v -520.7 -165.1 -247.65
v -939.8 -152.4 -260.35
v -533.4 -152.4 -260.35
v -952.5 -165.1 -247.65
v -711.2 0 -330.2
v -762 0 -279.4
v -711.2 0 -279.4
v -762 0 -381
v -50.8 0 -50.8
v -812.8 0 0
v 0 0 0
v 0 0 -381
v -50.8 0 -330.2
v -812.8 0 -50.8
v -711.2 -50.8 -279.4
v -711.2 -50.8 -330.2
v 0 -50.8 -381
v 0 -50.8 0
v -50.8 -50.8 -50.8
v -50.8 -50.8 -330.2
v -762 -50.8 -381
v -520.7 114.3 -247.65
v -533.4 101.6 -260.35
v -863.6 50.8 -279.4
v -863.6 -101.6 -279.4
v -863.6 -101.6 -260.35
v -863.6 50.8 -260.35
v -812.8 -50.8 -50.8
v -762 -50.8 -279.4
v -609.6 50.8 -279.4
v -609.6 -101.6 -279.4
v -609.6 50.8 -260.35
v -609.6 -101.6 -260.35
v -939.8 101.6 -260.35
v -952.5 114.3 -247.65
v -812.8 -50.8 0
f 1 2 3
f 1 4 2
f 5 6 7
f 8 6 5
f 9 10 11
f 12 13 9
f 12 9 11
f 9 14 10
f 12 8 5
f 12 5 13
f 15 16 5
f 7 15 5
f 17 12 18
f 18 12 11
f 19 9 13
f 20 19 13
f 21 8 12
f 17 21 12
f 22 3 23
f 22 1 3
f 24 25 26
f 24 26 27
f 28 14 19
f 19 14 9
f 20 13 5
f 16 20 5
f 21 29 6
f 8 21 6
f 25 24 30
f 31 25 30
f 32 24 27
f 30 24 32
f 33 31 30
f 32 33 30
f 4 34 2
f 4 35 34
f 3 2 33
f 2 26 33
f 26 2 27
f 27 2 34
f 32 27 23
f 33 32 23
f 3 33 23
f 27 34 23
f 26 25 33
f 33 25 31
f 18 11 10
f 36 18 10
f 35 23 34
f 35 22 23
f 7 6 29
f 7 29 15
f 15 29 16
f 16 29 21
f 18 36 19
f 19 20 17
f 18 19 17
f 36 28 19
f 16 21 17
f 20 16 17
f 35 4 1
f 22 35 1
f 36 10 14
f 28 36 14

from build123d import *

# Parameters (mm, degrees)
F1_DEPTH = 50.8
F2_W     = 50.8
F2_H     = 50.8
F3_DEPTH = 50.8
F4_W     = 50.8
F4_H     = 50.8
F5_DEPTH = 50.8
F6_W     = 254
F6_H     = 152.4
F6_W_2   = 50.8
F6_H_2   = 50.8
F7_DEPTH = 19.05
F8_W     = 406.4
F8_H     = 254
F9_DEPTH = 12.7
F9_TAPER = -45


with BuildPart() as f1:
    # F0 (on Front) → F1 (new body)
    with BuildSketch(Plane.XZ):
        Polygon((0, -381), (0, 0), (-812.8, 0), (-812.8, -50.8), (-50.8, -50.8), (-50.8, -330.2), (-812.8, -330.2), (-812.8, -381), align=None)
    extrude(amount=F1_DEPTH)

    # F2 (on face) → F3 (cut)
    with BuildSketch(Plane.XZ.offset(50.8)):
        with Locations((-787.4, -355.6)):
            Rectangle(F2_W, F2_H)
    extrude(amount=-F3_DEPTH, mode=Mode.SUBTRACT)

    # F4 (on face) → F5 (join)
    with BuildSketch(Plane.XY.offset(-330.2)):
        with Locations((-736.6, -25.4)):
            Rectangle(F4_W, F4_H)
    extrude(amount=F5_DEPTH)


with BuildPart() as f7:
    # F6 (on face) → F7 (new body)
    with BuildSketch(Plane.XY.offset(-279.4)):
        with Locations((-736.6, -25.4)):
            Rectangle(F6_W, F6_H)
        with Locations((-736.6, -25.4)):
            Rectangle(F6_W_2, F6_H_2, mode=Mode.SUBTRACT)
        with Locations((-736.6, -25.4)):
            Rectangle(F6_W_2, F6_H_2)
    extrude(amount=F7_DEPTH)

    # F8 (on face) → F9 (join)
    with BuildSketch(Plane.XY.offset(-260.35)):
        with Locations((-736.6, -25.4)):
            Rectangle(F8_W, F8_H)
    extrude(amount=F9_DEPTH, taper=F9_TAPER)


solid = Compound([f1.part, f7.part])
